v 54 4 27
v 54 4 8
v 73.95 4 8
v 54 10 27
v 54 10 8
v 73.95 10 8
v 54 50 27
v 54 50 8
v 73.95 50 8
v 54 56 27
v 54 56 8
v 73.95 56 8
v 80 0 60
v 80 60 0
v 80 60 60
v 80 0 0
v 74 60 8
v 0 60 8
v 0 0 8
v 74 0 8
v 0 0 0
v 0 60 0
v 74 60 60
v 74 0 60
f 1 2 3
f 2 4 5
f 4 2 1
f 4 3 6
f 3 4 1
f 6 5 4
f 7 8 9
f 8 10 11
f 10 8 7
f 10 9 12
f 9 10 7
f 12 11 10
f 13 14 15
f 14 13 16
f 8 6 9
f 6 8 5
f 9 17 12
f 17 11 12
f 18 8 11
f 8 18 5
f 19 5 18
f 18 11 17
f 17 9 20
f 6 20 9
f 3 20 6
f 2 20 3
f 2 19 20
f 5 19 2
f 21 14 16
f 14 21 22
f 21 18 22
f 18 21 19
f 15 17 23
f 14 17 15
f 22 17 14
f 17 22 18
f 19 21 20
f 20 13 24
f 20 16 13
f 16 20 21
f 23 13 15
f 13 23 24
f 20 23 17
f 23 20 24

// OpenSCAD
$fn = 32;

// ----------------------------------------------------------------------
// Rib bracket: 2-gusset L bracket
// ----------------------------------------------------------------------

// --- parameters (mm) ---
base_l = 80;              // foot length, X
base_w = 60;              // foot width, Y
base_t = 8;               // foot thickness
plate_t = 6;              // upright plate thickness
plate_h = 60;             // overall height
gus_l = 20;               // gusset leg along the foot
gus_h = 20;               // gusset height
gus_t = 6;                // gusset thickness
gus_edge = 4;             // gusset margin from the foot edge
n_gus = 2;                // gusset count
fit_tol = 0.1;            // tolerance for press fits, mm
free_tol = 0.5;           // tolerance for clearance fits, mm

gus_pitch = (base_w - 2 * gus_edge - gus_t) / (n_gus - 1);  // gusset pitch

union() {
  cube([base_l, base_w, base_t]);
  translate([base_l - plate_t, 0, base_t - 1])
    cube([plate_t, base_w, plate_h - base_t + 1]);
  for (i = [0 : n_gus - 1])
    translate([base_l - plate_t - gus_l, gus_edge + i * gus_pitch, base_t - 1])
      rotate([-90, 0, 0])
        linear_extrude(height = gus_t)
          polygon(points = [[0, 0], [gus_l + 1, 0], [0, -gus_h]]);
}
